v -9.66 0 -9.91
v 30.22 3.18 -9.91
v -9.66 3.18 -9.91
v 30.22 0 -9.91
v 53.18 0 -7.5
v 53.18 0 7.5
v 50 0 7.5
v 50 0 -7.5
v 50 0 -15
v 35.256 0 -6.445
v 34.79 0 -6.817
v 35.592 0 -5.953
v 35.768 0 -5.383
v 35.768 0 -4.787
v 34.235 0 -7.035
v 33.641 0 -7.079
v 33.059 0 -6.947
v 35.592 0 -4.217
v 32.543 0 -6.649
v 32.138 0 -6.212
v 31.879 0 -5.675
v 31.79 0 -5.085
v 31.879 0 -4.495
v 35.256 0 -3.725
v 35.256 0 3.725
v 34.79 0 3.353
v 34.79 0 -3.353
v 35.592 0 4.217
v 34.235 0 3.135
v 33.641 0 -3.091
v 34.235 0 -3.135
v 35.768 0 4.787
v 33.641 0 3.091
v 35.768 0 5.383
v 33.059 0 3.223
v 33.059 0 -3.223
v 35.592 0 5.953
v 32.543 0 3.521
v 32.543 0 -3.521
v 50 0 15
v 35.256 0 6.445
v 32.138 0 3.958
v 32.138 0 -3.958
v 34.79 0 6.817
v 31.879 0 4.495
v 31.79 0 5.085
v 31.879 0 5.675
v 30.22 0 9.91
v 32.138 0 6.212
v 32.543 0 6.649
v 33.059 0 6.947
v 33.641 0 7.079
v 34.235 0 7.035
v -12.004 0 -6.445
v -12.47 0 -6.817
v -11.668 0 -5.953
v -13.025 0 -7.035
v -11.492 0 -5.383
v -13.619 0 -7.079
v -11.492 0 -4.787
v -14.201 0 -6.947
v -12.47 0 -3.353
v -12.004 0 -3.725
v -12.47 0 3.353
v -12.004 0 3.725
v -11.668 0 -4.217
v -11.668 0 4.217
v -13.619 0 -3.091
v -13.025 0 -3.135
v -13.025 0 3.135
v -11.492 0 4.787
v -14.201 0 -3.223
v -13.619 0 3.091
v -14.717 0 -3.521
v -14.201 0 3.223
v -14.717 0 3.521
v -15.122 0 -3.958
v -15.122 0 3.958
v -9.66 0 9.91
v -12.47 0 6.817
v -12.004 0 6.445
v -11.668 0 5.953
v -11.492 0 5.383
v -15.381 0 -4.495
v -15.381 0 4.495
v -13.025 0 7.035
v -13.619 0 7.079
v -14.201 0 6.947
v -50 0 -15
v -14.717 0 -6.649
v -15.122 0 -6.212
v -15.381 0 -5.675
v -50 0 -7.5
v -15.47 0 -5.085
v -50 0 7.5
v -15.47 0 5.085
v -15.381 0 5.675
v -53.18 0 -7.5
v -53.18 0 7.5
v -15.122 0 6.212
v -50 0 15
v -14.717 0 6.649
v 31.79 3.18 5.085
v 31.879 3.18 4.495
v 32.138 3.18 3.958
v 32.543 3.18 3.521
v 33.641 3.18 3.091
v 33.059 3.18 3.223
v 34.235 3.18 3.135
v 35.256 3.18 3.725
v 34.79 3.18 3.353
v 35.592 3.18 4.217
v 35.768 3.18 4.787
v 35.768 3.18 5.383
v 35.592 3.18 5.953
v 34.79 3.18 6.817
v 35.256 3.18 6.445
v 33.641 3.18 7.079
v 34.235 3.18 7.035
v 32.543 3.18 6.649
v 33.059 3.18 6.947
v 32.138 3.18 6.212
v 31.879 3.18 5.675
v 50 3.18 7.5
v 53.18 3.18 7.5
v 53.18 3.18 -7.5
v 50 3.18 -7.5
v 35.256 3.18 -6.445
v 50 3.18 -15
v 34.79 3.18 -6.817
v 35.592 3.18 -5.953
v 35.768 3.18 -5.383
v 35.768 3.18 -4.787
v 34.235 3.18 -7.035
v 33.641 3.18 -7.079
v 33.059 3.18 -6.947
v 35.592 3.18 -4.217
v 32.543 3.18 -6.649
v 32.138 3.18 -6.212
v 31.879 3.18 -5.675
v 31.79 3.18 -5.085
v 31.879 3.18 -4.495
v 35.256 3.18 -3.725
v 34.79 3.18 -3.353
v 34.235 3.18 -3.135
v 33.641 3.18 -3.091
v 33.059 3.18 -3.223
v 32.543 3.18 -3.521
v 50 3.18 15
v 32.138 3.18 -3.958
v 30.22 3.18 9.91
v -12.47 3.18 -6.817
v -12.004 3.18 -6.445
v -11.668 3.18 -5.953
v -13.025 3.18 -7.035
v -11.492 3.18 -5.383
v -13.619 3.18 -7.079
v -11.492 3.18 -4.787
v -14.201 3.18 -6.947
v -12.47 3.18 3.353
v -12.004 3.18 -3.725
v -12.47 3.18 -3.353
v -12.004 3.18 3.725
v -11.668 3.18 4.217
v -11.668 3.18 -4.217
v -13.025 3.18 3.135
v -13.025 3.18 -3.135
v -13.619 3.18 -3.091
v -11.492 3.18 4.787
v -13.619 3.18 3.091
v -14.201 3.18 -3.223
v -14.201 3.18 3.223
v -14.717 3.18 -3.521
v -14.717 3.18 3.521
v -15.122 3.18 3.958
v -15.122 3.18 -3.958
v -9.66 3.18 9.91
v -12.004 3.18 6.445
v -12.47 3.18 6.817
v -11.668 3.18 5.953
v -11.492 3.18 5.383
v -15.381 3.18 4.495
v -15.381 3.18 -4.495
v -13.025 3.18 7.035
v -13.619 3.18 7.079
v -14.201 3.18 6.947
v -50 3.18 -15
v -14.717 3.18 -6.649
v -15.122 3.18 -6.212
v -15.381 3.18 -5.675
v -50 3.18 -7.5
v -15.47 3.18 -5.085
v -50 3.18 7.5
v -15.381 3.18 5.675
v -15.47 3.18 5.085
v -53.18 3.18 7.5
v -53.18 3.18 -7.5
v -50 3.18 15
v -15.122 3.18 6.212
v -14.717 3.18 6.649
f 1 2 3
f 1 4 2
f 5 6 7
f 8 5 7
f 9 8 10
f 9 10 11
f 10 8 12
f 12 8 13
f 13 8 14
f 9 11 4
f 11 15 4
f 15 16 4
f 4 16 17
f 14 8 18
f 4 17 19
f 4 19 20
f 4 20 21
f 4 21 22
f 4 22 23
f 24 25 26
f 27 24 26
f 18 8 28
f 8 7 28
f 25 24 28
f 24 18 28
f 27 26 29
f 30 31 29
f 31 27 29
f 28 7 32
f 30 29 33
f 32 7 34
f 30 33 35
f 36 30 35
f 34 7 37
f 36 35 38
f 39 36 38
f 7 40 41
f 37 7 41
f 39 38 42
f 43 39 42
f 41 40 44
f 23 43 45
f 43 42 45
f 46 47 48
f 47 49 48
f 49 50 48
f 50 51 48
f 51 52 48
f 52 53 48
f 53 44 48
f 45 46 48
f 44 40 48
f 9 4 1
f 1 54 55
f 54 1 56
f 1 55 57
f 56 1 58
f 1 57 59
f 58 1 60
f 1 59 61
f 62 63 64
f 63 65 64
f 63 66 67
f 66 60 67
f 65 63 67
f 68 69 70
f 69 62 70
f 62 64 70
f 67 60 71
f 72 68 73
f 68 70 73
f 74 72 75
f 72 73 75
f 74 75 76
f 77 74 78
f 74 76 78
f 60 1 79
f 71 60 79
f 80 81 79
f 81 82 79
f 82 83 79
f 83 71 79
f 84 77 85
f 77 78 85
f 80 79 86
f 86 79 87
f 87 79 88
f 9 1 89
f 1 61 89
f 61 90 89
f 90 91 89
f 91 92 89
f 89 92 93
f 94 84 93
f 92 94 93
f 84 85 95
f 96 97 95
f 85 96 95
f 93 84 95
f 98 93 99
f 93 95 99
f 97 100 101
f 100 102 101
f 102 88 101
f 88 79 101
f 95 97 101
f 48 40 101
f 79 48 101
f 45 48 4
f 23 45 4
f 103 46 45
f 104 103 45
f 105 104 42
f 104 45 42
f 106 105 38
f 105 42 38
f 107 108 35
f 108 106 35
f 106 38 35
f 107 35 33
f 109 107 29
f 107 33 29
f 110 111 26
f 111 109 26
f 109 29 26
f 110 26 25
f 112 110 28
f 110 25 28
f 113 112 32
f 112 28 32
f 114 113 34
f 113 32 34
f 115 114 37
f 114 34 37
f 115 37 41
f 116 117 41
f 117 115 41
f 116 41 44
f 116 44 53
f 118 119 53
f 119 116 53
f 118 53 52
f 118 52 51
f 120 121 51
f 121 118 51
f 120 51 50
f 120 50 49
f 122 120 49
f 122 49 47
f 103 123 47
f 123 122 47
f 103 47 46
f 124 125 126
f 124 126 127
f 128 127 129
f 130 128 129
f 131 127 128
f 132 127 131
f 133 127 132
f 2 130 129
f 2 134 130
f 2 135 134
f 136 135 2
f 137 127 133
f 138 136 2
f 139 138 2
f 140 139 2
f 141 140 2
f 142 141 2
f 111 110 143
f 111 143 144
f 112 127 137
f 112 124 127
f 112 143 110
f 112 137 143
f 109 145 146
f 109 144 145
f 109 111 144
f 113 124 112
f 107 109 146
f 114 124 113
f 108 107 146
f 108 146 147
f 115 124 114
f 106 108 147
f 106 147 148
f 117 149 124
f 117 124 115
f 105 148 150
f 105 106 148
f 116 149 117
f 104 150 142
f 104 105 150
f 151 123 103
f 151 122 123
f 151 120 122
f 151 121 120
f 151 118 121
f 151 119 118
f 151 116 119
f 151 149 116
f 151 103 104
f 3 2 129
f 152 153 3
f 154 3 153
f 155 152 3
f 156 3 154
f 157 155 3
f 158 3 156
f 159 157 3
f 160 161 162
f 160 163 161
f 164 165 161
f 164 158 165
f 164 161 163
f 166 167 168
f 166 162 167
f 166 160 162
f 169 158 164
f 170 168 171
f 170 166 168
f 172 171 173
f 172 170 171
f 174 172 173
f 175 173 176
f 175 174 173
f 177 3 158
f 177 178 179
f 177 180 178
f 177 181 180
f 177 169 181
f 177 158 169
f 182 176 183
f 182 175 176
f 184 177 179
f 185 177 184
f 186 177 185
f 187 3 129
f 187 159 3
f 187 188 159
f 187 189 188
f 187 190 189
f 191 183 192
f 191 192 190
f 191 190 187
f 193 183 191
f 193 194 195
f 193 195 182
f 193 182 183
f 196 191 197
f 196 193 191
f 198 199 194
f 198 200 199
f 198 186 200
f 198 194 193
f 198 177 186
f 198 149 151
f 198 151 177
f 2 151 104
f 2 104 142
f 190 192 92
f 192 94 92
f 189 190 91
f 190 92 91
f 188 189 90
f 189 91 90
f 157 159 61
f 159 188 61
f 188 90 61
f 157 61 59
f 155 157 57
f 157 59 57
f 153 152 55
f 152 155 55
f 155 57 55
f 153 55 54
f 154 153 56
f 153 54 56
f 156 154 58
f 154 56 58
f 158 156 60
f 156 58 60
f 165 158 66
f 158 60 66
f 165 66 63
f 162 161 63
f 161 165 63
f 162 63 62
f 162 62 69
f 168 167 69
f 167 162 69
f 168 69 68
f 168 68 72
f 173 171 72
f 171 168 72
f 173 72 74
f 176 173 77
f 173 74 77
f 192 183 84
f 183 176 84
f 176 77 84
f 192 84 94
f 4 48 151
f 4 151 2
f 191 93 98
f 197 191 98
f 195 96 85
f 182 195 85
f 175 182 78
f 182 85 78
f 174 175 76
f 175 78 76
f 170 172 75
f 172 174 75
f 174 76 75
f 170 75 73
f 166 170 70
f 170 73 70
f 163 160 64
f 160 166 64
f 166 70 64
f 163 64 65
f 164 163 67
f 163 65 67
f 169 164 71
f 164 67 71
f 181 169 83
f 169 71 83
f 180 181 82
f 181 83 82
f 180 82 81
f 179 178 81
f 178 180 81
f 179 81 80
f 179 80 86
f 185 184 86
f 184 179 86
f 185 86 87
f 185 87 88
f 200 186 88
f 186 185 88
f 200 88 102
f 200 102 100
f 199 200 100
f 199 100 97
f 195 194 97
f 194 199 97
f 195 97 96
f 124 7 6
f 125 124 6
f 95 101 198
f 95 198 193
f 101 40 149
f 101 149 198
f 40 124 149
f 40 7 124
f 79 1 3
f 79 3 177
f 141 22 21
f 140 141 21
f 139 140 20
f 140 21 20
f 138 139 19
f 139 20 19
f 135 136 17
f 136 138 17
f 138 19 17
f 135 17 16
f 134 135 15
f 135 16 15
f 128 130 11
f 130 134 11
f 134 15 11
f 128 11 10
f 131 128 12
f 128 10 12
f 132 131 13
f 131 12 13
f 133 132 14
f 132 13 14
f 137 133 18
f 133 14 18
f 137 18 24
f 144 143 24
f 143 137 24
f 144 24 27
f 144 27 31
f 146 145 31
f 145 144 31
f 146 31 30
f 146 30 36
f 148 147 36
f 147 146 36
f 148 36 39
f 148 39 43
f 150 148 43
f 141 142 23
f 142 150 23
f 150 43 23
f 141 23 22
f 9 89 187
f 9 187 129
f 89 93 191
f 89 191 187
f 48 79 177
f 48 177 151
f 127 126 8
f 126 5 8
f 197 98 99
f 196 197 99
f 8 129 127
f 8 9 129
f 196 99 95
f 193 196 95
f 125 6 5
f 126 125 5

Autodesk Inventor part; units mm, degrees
ref_plane "YZ Plane" through (0, 0, 0) normal (1, 0, 0) x (0, 1, 0)
ref_plane "XZ Plane" through (0, 0, 0) normal (0, 1, 0) x (-1, 0, 0)
ref_plane "XY Plane" through (0, 0, 0) normal (0, 0, 1) x (1, 0, 0)
sketch "Boceto2" plane through (0, 0, 0) normal (0, 1, 0) x (-1, 0, 0)
  circle A0 centre (0, 0) radius 5
  line L0 (9.66, 9.91) -> (-30.22, 9.91)
  line L1 (-30.22, 9.91) -> (-30.22, -9.91)
  line L2 (-30.22, -9.91) -> (9.66, -9.91)
  line L3 (9.66, -9.91) -> (9.66, 9.91)
  circle A1 centre (-33.79, 5.085) radius 2
  circle A2 centre (13.47, -5.085) radius 2
  circle A3 centre (13.47, 5.085) radius 2
  circle A4 centre (-33.79, -5.085) radius 2
  line L4 (-50, 15) -> (50, 15)
  line L5 (50, 15) -> (50, -15)
  line L6 (50, -15) -> (-50, -15)
  line L7 (-50, -15) -> (-50, 15)
  line L8 (-50, 15) -> (50, -15) construction
  line L9 (50, 15) -> (-50, -15) construction
  line L10 (53.18, 7.5) -> (50, 7.5)
  line L11 (50, 7.5) -> (50, -7.5)
  line L12 (50, -7.5) -> (53.18, -7.5)
  line L13 (53.18, -7.5) -> (53.18, 7.5)
  line L14 (-50, 7.5) -> (-53.18, 7.5)
  line L15 (-53.18, 7.5) -> (-53.18, -7.5)
  line L16 (-53.18, -7.5) -> (-50, -7.5)
  line L17 (-50, -7.5) -> (-50, 7.5)
  dimension "d2" = 10
  dimension "d3" = 9.91
  dimension "d4" = 19.82
  dimension "d5" = 9.66
  dimension "d6" = 39.88
  dimension "d7" = 4
  dimension "d8" = 4
  dimension "d9" = 4
  dimension "d10" = 5.085
  dimension "d11" = 10.17
  dimension "d12" = 13.47
  dimension "d13" = 13.47
  dimension "d14" = 4
  dimension "d15" = 33.79
  dimension "d16" = 33.79
  dimension "d17" = 5.085
  dimension "d18" = 10.17
  dimension "d19" = 100
  dimension "d20" = 30
  dimension "d21" = 3.18
  dimension "d22" = 15
  dimension "d23" = 7.5
  dimension "d24" = 15
  dimension "d25" = 3.18
  dimension "d26" = 7.5
extrude "Extrusión1" add sketch "Boceto2" along normal blind 3.18 contours L4 L5 L6 L7 | L7 L16 L15 L14 | L10 L13 L12 L5
properties part number "BASE_SOST.SERVO"
